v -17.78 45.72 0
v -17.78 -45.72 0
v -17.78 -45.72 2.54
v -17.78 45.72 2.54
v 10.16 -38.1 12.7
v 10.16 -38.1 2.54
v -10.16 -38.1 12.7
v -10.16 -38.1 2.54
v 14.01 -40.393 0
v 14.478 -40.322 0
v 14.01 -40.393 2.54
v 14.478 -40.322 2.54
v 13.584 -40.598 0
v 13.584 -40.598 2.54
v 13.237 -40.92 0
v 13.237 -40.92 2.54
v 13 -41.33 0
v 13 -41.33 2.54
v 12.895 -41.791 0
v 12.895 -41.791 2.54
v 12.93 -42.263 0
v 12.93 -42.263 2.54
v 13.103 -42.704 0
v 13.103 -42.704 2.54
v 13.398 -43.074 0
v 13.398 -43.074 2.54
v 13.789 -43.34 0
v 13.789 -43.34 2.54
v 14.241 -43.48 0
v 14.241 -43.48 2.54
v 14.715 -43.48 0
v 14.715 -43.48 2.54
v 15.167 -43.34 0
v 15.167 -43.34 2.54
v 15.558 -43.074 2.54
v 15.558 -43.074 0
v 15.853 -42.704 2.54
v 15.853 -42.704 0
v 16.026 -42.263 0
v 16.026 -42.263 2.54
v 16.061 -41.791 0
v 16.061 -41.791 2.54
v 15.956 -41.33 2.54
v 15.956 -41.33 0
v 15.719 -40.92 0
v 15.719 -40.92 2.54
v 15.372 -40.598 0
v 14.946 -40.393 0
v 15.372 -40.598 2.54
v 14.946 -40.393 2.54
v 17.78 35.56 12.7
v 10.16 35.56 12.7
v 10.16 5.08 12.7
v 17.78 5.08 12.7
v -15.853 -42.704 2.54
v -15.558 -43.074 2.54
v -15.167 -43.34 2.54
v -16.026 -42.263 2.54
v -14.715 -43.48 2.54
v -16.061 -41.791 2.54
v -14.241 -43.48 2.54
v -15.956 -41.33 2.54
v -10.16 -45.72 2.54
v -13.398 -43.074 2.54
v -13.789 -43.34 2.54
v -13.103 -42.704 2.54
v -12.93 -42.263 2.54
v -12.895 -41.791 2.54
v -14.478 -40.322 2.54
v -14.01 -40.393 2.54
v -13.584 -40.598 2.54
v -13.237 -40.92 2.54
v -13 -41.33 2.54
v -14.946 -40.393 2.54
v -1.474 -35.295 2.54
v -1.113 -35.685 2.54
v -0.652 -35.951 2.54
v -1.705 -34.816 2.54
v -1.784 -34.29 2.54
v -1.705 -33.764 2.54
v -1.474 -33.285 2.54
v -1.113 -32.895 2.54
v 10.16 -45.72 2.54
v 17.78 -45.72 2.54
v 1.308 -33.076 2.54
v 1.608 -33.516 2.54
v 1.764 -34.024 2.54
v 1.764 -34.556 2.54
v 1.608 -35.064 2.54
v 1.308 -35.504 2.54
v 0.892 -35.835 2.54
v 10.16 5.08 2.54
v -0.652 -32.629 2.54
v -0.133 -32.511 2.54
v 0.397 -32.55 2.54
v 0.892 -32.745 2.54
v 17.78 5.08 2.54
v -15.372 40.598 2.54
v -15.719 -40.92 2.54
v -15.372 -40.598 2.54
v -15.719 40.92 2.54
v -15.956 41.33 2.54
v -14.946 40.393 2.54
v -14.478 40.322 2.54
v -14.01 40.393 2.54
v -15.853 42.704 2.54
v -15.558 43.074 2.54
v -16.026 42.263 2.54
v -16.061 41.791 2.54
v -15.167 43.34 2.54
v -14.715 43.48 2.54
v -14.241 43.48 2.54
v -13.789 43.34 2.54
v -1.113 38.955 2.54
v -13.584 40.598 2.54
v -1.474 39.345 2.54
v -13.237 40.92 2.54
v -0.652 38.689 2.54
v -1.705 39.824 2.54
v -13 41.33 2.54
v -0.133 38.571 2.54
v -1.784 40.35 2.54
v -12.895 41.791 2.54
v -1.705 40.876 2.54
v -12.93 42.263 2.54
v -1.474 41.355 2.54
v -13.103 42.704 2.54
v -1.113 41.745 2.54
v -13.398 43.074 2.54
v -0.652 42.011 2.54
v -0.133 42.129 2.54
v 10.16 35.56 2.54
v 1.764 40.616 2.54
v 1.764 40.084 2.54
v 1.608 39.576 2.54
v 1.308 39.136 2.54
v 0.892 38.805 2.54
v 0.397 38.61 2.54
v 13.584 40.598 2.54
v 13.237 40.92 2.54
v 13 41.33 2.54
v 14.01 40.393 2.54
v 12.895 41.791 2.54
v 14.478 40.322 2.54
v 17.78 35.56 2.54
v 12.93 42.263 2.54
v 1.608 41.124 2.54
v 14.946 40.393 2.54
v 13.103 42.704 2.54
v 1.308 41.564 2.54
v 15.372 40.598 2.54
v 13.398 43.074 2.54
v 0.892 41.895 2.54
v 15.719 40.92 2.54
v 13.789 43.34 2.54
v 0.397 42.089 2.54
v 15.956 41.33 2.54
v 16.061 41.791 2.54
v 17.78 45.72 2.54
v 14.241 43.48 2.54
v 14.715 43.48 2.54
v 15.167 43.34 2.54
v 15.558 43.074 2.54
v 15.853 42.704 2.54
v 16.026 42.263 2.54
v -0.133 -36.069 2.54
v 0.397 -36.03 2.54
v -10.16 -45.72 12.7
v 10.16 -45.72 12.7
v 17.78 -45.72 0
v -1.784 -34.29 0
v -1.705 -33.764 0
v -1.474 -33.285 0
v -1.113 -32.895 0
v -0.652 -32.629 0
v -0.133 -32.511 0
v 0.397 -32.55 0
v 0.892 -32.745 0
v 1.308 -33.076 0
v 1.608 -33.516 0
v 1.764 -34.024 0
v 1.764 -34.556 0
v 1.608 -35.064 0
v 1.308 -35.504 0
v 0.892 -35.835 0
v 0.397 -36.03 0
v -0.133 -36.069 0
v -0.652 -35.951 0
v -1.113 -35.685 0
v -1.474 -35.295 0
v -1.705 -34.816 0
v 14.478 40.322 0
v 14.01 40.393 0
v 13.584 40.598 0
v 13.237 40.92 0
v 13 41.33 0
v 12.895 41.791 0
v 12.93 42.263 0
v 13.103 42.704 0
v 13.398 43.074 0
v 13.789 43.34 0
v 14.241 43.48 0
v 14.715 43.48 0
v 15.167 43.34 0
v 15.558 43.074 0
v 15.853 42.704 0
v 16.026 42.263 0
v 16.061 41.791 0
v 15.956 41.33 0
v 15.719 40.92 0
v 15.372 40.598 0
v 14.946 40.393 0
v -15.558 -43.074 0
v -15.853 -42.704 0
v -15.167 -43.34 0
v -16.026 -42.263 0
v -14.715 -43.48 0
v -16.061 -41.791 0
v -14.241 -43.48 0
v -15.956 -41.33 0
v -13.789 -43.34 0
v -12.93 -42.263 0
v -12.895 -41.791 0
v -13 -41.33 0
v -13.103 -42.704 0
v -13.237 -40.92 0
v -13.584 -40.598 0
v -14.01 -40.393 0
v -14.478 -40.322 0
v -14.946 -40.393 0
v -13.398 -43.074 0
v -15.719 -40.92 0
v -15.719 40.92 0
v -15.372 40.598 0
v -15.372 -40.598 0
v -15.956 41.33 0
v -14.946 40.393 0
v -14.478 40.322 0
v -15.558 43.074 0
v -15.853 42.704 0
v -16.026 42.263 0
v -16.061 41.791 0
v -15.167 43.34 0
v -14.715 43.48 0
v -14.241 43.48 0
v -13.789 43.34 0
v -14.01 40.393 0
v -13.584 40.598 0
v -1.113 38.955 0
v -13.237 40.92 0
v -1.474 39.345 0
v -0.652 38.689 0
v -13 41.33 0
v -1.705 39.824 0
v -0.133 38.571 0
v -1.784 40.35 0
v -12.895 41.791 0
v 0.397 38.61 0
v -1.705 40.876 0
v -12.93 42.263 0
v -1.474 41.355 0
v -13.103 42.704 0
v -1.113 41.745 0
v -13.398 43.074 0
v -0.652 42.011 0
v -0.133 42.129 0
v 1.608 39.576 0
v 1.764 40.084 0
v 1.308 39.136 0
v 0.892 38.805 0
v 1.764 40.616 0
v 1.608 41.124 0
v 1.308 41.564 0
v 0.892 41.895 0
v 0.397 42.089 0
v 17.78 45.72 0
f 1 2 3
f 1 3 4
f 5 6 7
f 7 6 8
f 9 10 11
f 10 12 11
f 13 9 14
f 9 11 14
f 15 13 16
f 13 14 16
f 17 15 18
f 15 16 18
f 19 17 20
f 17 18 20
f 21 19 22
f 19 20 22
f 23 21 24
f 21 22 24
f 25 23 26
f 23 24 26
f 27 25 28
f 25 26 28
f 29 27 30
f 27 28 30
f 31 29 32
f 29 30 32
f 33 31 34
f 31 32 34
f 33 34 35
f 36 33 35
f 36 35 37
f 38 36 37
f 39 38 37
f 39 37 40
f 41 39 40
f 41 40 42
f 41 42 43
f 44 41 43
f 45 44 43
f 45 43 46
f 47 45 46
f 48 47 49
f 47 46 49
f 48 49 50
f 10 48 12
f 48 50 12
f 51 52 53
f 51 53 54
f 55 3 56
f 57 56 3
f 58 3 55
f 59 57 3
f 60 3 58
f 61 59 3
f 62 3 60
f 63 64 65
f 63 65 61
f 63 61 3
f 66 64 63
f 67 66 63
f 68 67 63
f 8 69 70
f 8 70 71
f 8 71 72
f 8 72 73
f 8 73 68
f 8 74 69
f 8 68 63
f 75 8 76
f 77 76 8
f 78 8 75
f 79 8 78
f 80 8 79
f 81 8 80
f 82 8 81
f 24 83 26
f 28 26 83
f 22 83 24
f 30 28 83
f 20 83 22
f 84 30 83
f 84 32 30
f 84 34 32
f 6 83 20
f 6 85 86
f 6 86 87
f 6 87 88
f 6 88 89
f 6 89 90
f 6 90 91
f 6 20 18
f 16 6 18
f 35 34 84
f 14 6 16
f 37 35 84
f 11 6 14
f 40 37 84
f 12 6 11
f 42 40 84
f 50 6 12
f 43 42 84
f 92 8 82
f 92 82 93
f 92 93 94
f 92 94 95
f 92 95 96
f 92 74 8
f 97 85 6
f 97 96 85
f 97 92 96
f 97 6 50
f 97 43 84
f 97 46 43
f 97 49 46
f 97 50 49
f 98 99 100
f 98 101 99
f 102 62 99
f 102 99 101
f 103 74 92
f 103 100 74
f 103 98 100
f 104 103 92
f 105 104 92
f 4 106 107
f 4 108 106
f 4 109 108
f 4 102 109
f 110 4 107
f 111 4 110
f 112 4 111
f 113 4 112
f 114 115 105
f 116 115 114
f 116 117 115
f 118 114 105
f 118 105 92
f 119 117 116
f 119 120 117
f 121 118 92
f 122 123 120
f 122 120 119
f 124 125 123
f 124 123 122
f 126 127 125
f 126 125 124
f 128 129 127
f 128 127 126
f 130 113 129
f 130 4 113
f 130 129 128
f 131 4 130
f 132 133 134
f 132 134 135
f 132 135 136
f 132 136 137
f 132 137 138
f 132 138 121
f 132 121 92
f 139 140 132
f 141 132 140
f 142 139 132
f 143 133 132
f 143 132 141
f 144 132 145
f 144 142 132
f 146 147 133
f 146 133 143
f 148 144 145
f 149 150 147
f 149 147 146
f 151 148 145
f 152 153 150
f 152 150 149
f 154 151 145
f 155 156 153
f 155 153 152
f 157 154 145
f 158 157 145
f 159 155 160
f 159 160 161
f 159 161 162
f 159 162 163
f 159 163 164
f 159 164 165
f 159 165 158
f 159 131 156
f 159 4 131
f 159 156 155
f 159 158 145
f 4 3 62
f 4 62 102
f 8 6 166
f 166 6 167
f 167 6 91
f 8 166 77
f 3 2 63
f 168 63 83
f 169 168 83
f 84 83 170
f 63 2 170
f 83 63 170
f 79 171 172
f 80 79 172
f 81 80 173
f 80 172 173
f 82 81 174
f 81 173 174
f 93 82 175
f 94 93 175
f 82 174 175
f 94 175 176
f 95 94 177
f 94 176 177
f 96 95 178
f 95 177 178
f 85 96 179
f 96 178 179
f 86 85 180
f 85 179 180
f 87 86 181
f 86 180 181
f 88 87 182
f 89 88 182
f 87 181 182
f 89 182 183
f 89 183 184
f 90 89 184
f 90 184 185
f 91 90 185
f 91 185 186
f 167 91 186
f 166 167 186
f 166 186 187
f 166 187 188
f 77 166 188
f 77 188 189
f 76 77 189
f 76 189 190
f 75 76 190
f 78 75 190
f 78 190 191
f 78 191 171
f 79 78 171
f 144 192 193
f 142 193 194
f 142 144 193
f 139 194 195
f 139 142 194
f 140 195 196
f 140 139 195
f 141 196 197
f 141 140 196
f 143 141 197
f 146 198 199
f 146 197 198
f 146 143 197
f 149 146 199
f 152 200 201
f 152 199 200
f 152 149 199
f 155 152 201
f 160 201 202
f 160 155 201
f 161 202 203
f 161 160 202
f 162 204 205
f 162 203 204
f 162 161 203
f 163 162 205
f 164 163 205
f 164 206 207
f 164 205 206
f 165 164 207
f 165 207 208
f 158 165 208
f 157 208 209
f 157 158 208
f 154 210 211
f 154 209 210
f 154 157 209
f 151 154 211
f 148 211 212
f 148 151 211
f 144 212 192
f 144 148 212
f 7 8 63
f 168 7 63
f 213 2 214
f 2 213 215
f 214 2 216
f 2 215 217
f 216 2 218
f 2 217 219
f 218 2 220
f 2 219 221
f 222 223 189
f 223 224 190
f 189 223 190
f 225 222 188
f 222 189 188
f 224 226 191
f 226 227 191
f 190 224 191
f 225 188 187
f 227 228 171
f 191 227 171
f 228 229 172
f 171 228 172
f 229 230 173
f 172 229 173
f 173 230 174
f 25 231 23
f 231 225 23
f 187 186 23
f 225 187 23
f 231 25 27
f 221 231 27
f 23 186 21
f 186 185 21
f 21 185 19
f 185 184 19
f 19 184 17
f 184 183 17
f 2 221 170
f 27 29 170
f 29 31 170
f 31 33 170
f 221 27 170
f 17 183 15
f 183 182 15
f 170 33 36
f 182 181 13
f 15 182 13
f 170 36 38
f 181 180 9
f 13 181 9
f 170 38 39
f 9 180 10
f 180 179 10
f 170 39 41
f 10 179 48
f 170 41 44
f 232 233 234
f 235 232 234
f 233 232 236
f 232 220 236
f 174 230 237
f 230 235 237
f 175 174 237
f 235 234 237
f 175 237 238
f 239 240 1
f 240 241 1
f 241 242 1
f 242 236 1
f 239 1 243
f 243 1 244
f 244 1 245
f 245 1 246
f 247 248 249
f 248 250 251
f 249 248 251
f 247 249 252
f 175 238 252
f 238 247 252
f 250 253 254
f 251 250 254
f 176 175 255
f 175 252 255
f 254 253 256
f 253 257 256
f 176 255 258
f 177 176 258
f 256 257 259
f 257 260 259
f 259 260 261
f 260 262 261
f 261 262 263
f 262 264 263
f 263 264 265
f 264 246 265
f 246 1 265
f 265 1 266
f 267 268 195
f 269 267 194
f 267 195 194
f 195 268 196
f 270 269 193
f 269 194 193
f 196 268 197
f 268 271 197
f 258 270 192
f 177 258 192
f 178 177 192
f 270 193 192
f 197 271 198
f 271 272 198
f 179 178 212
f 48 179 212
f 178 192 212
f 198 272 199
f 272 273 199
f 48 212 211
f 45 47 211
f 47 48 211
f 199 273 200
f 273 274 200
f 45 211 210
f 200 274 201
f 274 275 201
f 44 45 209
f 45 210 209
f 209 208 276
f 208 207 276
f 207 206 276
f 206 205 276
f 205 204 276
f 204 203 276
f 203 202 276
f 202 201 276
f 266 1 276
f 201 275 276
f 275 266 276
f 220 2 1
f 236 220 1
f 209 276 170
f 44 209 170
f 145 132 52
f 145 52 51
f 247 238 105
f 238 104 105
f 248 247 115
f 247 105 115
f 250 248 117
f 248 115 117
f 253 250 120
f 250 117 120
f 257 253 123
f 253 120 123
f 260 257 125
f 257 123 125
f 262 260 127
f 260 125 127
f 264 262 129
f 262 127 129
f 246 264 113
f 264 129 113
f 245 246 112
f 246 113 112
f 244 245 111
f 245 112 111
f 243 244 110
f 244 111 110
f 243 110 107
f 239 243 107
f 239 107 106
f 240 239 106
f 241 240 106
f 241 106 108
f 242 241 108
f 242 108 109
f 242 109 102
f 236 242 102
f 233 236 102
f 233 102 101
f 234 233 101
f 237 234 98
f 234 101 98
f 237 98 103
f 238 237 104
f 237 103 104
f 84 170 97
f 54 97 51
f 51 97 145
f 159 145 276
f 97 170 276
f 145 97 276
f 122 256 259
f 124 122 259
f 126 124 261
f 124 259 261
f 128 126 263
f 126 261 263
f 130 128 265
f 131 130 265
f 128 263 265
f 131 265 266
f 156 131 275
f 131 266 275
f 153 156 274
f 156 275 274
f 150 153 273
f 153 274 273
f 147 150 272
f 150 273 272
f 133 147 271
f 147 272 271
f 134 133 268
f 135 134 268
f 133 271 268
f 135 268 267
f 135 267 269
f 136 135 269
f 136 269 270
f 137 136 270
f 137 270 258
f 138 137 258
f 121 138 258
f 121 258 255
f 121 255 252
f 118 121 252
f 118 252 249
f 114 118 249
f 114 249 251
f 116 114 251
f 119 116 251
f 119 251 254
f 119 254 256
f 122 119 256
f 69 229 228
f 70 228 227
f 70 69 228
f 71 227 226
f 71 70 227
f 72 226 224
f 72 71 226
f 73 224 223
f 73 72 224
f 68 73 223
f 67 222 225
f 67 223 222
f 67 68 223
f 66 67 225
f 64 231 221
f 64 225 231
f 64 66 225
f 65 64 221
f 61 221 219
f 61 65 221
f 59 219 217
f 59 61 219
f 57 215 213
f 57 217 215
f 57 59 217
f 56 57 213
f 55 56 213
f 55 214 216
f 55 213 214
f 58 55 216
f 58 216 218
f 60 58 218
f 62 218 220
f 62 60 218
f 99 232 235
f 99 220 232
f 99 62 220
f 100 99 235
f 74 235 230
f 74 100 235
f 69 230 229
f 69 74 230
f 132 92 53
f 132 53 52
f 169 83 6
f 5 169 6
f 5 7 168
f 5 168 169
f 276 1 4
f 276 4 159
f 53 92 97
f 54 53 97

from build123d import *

# Parameters (mm, degrees)
SKETCH1_W                        = 35.56
SKETCH1_H                        = 91.44
EXTRUDE1_DEPTH                   = 2.54
F_28_0_1405_DIAMETER_HOLE1_D     = 3.5687
F_28_0_1405_DIAMETER_HOLE1_DEPTH = 15.24
F_28_0_1405_DIAMETER_HOLE1_TIP   = 1.072145646
EXTRUDE2_DEPTH                   = 10.16
SKETCH7_W                        = 7.62
SKETCH7_H                        = 30.48
EXTRUDE3_DEPTH                   = 10.16


with BuildPart() as part:
    # Sketch1 → Extrude1 (new body)
    with BuildSketch(Plane.XY):
        Rectangle(SKETCH1_W, SKETCH1_H)
    extrude(amount=EXTRUDE1_DEPTH)

    # Sketch3 → 1/8 (0.125) Diameter Hole1 (revolve, cut)
    with BuildSketch(Plane(origin=(14.478, 41.91, 2.54), x_dir=(0, -1, 0), z_dir=(1, 0, 0))):
        Polygon((0, 0), (0, 16.193866233), (1.5875, 15.24), (1.5875, 0), align=None)
    f_1_8_0_125_diameter_hole1 = revolve(axis=Axis((14.478, 41.91, 8.89), (0, 0, -1)), mode=Mode.SUBTRACT)

    # Mirror1: 1/8 (0.125) Diameter Hole1 across plane
    add(f_1_8_0_125_diameter_hole1.mirror(Plane(origin=(0, 0, 0), x_dir=(0, 0, 1), z_dir=(1, 0, 0))), mode=Mode.SUBTRACT)

    # Mirror2: 1/8 (0.125) Diameter Hole1 across plane
    add(f_1_8_0_125_diameter_hole1.mirror(Plane.ZX), mode=Mode.SUBTRACT)

    # Mirror2 copy 1 sketch → Mirror2 copy 1 (revolve, cut)
    with BuildSketch(Plane(origin=(-14.478, -41.91, 2.54), x_dir=(0, 1, 0), z_dir=(-1, 0, 0))):
        Polygon((0, 0), (0, 16.193866233), (1.5875, 15.24), (1.5875, 0), align=None)
    revolve(axis=Axis((-14.478, -41.91, 8.89), (0, 0, -1)), mode=Mode.SUBTRACT)

    # #28 (0.1405) Diameter Hole1
    with Locations(Plane(origin=(0, -34.29, 2.54), x_dir=(1, 0, 0), z_dir=(0, 0, 1))):
        with Locations((0, 0), (0, 74.639874629)):
            Hole(F_28_0_1405_DIAMETER_HOLE1_D / 2, depth=F_28_0_1405_DIAMETER_HOLE1_DEPTH)
            with Locations((0, 0, -(F_28_0_1405_DIAMETER_HOLE1_DEPTH + F_28_0_1405_DIAMETER_HOLE1_TIP / 2))):  # 118° drill point
                Cone(0, F_28_0_1405_DIAMETER_HOLE1_D / 2, F_28_0_1405_DIAMETER_HOLE1_TIP, mode=Mode.SUBTRACT)

    # Sketch6 → Extrude2 (add)
    with BuildSketch(Plane.XY.offset(2.54)):
        Polygon((0, -45.72), (10.16, -45.72), (10.16, -38.1), (-10.16, -38.1), (-10.16, -45.72), align=None)
    extrude(amount=EXTRUDE2_DEPTH)

    # Sketch7 → Extrude3 (add)
    with BuildSketch(Plane.XY.offset(2.54)):
        with Locations((13.97, 20.32)):
            Rectangle(SKETCH7_W, SKETCH7_H)
    extrude(amount=EXTRUDE3_DEPTH)


solid = part.part
